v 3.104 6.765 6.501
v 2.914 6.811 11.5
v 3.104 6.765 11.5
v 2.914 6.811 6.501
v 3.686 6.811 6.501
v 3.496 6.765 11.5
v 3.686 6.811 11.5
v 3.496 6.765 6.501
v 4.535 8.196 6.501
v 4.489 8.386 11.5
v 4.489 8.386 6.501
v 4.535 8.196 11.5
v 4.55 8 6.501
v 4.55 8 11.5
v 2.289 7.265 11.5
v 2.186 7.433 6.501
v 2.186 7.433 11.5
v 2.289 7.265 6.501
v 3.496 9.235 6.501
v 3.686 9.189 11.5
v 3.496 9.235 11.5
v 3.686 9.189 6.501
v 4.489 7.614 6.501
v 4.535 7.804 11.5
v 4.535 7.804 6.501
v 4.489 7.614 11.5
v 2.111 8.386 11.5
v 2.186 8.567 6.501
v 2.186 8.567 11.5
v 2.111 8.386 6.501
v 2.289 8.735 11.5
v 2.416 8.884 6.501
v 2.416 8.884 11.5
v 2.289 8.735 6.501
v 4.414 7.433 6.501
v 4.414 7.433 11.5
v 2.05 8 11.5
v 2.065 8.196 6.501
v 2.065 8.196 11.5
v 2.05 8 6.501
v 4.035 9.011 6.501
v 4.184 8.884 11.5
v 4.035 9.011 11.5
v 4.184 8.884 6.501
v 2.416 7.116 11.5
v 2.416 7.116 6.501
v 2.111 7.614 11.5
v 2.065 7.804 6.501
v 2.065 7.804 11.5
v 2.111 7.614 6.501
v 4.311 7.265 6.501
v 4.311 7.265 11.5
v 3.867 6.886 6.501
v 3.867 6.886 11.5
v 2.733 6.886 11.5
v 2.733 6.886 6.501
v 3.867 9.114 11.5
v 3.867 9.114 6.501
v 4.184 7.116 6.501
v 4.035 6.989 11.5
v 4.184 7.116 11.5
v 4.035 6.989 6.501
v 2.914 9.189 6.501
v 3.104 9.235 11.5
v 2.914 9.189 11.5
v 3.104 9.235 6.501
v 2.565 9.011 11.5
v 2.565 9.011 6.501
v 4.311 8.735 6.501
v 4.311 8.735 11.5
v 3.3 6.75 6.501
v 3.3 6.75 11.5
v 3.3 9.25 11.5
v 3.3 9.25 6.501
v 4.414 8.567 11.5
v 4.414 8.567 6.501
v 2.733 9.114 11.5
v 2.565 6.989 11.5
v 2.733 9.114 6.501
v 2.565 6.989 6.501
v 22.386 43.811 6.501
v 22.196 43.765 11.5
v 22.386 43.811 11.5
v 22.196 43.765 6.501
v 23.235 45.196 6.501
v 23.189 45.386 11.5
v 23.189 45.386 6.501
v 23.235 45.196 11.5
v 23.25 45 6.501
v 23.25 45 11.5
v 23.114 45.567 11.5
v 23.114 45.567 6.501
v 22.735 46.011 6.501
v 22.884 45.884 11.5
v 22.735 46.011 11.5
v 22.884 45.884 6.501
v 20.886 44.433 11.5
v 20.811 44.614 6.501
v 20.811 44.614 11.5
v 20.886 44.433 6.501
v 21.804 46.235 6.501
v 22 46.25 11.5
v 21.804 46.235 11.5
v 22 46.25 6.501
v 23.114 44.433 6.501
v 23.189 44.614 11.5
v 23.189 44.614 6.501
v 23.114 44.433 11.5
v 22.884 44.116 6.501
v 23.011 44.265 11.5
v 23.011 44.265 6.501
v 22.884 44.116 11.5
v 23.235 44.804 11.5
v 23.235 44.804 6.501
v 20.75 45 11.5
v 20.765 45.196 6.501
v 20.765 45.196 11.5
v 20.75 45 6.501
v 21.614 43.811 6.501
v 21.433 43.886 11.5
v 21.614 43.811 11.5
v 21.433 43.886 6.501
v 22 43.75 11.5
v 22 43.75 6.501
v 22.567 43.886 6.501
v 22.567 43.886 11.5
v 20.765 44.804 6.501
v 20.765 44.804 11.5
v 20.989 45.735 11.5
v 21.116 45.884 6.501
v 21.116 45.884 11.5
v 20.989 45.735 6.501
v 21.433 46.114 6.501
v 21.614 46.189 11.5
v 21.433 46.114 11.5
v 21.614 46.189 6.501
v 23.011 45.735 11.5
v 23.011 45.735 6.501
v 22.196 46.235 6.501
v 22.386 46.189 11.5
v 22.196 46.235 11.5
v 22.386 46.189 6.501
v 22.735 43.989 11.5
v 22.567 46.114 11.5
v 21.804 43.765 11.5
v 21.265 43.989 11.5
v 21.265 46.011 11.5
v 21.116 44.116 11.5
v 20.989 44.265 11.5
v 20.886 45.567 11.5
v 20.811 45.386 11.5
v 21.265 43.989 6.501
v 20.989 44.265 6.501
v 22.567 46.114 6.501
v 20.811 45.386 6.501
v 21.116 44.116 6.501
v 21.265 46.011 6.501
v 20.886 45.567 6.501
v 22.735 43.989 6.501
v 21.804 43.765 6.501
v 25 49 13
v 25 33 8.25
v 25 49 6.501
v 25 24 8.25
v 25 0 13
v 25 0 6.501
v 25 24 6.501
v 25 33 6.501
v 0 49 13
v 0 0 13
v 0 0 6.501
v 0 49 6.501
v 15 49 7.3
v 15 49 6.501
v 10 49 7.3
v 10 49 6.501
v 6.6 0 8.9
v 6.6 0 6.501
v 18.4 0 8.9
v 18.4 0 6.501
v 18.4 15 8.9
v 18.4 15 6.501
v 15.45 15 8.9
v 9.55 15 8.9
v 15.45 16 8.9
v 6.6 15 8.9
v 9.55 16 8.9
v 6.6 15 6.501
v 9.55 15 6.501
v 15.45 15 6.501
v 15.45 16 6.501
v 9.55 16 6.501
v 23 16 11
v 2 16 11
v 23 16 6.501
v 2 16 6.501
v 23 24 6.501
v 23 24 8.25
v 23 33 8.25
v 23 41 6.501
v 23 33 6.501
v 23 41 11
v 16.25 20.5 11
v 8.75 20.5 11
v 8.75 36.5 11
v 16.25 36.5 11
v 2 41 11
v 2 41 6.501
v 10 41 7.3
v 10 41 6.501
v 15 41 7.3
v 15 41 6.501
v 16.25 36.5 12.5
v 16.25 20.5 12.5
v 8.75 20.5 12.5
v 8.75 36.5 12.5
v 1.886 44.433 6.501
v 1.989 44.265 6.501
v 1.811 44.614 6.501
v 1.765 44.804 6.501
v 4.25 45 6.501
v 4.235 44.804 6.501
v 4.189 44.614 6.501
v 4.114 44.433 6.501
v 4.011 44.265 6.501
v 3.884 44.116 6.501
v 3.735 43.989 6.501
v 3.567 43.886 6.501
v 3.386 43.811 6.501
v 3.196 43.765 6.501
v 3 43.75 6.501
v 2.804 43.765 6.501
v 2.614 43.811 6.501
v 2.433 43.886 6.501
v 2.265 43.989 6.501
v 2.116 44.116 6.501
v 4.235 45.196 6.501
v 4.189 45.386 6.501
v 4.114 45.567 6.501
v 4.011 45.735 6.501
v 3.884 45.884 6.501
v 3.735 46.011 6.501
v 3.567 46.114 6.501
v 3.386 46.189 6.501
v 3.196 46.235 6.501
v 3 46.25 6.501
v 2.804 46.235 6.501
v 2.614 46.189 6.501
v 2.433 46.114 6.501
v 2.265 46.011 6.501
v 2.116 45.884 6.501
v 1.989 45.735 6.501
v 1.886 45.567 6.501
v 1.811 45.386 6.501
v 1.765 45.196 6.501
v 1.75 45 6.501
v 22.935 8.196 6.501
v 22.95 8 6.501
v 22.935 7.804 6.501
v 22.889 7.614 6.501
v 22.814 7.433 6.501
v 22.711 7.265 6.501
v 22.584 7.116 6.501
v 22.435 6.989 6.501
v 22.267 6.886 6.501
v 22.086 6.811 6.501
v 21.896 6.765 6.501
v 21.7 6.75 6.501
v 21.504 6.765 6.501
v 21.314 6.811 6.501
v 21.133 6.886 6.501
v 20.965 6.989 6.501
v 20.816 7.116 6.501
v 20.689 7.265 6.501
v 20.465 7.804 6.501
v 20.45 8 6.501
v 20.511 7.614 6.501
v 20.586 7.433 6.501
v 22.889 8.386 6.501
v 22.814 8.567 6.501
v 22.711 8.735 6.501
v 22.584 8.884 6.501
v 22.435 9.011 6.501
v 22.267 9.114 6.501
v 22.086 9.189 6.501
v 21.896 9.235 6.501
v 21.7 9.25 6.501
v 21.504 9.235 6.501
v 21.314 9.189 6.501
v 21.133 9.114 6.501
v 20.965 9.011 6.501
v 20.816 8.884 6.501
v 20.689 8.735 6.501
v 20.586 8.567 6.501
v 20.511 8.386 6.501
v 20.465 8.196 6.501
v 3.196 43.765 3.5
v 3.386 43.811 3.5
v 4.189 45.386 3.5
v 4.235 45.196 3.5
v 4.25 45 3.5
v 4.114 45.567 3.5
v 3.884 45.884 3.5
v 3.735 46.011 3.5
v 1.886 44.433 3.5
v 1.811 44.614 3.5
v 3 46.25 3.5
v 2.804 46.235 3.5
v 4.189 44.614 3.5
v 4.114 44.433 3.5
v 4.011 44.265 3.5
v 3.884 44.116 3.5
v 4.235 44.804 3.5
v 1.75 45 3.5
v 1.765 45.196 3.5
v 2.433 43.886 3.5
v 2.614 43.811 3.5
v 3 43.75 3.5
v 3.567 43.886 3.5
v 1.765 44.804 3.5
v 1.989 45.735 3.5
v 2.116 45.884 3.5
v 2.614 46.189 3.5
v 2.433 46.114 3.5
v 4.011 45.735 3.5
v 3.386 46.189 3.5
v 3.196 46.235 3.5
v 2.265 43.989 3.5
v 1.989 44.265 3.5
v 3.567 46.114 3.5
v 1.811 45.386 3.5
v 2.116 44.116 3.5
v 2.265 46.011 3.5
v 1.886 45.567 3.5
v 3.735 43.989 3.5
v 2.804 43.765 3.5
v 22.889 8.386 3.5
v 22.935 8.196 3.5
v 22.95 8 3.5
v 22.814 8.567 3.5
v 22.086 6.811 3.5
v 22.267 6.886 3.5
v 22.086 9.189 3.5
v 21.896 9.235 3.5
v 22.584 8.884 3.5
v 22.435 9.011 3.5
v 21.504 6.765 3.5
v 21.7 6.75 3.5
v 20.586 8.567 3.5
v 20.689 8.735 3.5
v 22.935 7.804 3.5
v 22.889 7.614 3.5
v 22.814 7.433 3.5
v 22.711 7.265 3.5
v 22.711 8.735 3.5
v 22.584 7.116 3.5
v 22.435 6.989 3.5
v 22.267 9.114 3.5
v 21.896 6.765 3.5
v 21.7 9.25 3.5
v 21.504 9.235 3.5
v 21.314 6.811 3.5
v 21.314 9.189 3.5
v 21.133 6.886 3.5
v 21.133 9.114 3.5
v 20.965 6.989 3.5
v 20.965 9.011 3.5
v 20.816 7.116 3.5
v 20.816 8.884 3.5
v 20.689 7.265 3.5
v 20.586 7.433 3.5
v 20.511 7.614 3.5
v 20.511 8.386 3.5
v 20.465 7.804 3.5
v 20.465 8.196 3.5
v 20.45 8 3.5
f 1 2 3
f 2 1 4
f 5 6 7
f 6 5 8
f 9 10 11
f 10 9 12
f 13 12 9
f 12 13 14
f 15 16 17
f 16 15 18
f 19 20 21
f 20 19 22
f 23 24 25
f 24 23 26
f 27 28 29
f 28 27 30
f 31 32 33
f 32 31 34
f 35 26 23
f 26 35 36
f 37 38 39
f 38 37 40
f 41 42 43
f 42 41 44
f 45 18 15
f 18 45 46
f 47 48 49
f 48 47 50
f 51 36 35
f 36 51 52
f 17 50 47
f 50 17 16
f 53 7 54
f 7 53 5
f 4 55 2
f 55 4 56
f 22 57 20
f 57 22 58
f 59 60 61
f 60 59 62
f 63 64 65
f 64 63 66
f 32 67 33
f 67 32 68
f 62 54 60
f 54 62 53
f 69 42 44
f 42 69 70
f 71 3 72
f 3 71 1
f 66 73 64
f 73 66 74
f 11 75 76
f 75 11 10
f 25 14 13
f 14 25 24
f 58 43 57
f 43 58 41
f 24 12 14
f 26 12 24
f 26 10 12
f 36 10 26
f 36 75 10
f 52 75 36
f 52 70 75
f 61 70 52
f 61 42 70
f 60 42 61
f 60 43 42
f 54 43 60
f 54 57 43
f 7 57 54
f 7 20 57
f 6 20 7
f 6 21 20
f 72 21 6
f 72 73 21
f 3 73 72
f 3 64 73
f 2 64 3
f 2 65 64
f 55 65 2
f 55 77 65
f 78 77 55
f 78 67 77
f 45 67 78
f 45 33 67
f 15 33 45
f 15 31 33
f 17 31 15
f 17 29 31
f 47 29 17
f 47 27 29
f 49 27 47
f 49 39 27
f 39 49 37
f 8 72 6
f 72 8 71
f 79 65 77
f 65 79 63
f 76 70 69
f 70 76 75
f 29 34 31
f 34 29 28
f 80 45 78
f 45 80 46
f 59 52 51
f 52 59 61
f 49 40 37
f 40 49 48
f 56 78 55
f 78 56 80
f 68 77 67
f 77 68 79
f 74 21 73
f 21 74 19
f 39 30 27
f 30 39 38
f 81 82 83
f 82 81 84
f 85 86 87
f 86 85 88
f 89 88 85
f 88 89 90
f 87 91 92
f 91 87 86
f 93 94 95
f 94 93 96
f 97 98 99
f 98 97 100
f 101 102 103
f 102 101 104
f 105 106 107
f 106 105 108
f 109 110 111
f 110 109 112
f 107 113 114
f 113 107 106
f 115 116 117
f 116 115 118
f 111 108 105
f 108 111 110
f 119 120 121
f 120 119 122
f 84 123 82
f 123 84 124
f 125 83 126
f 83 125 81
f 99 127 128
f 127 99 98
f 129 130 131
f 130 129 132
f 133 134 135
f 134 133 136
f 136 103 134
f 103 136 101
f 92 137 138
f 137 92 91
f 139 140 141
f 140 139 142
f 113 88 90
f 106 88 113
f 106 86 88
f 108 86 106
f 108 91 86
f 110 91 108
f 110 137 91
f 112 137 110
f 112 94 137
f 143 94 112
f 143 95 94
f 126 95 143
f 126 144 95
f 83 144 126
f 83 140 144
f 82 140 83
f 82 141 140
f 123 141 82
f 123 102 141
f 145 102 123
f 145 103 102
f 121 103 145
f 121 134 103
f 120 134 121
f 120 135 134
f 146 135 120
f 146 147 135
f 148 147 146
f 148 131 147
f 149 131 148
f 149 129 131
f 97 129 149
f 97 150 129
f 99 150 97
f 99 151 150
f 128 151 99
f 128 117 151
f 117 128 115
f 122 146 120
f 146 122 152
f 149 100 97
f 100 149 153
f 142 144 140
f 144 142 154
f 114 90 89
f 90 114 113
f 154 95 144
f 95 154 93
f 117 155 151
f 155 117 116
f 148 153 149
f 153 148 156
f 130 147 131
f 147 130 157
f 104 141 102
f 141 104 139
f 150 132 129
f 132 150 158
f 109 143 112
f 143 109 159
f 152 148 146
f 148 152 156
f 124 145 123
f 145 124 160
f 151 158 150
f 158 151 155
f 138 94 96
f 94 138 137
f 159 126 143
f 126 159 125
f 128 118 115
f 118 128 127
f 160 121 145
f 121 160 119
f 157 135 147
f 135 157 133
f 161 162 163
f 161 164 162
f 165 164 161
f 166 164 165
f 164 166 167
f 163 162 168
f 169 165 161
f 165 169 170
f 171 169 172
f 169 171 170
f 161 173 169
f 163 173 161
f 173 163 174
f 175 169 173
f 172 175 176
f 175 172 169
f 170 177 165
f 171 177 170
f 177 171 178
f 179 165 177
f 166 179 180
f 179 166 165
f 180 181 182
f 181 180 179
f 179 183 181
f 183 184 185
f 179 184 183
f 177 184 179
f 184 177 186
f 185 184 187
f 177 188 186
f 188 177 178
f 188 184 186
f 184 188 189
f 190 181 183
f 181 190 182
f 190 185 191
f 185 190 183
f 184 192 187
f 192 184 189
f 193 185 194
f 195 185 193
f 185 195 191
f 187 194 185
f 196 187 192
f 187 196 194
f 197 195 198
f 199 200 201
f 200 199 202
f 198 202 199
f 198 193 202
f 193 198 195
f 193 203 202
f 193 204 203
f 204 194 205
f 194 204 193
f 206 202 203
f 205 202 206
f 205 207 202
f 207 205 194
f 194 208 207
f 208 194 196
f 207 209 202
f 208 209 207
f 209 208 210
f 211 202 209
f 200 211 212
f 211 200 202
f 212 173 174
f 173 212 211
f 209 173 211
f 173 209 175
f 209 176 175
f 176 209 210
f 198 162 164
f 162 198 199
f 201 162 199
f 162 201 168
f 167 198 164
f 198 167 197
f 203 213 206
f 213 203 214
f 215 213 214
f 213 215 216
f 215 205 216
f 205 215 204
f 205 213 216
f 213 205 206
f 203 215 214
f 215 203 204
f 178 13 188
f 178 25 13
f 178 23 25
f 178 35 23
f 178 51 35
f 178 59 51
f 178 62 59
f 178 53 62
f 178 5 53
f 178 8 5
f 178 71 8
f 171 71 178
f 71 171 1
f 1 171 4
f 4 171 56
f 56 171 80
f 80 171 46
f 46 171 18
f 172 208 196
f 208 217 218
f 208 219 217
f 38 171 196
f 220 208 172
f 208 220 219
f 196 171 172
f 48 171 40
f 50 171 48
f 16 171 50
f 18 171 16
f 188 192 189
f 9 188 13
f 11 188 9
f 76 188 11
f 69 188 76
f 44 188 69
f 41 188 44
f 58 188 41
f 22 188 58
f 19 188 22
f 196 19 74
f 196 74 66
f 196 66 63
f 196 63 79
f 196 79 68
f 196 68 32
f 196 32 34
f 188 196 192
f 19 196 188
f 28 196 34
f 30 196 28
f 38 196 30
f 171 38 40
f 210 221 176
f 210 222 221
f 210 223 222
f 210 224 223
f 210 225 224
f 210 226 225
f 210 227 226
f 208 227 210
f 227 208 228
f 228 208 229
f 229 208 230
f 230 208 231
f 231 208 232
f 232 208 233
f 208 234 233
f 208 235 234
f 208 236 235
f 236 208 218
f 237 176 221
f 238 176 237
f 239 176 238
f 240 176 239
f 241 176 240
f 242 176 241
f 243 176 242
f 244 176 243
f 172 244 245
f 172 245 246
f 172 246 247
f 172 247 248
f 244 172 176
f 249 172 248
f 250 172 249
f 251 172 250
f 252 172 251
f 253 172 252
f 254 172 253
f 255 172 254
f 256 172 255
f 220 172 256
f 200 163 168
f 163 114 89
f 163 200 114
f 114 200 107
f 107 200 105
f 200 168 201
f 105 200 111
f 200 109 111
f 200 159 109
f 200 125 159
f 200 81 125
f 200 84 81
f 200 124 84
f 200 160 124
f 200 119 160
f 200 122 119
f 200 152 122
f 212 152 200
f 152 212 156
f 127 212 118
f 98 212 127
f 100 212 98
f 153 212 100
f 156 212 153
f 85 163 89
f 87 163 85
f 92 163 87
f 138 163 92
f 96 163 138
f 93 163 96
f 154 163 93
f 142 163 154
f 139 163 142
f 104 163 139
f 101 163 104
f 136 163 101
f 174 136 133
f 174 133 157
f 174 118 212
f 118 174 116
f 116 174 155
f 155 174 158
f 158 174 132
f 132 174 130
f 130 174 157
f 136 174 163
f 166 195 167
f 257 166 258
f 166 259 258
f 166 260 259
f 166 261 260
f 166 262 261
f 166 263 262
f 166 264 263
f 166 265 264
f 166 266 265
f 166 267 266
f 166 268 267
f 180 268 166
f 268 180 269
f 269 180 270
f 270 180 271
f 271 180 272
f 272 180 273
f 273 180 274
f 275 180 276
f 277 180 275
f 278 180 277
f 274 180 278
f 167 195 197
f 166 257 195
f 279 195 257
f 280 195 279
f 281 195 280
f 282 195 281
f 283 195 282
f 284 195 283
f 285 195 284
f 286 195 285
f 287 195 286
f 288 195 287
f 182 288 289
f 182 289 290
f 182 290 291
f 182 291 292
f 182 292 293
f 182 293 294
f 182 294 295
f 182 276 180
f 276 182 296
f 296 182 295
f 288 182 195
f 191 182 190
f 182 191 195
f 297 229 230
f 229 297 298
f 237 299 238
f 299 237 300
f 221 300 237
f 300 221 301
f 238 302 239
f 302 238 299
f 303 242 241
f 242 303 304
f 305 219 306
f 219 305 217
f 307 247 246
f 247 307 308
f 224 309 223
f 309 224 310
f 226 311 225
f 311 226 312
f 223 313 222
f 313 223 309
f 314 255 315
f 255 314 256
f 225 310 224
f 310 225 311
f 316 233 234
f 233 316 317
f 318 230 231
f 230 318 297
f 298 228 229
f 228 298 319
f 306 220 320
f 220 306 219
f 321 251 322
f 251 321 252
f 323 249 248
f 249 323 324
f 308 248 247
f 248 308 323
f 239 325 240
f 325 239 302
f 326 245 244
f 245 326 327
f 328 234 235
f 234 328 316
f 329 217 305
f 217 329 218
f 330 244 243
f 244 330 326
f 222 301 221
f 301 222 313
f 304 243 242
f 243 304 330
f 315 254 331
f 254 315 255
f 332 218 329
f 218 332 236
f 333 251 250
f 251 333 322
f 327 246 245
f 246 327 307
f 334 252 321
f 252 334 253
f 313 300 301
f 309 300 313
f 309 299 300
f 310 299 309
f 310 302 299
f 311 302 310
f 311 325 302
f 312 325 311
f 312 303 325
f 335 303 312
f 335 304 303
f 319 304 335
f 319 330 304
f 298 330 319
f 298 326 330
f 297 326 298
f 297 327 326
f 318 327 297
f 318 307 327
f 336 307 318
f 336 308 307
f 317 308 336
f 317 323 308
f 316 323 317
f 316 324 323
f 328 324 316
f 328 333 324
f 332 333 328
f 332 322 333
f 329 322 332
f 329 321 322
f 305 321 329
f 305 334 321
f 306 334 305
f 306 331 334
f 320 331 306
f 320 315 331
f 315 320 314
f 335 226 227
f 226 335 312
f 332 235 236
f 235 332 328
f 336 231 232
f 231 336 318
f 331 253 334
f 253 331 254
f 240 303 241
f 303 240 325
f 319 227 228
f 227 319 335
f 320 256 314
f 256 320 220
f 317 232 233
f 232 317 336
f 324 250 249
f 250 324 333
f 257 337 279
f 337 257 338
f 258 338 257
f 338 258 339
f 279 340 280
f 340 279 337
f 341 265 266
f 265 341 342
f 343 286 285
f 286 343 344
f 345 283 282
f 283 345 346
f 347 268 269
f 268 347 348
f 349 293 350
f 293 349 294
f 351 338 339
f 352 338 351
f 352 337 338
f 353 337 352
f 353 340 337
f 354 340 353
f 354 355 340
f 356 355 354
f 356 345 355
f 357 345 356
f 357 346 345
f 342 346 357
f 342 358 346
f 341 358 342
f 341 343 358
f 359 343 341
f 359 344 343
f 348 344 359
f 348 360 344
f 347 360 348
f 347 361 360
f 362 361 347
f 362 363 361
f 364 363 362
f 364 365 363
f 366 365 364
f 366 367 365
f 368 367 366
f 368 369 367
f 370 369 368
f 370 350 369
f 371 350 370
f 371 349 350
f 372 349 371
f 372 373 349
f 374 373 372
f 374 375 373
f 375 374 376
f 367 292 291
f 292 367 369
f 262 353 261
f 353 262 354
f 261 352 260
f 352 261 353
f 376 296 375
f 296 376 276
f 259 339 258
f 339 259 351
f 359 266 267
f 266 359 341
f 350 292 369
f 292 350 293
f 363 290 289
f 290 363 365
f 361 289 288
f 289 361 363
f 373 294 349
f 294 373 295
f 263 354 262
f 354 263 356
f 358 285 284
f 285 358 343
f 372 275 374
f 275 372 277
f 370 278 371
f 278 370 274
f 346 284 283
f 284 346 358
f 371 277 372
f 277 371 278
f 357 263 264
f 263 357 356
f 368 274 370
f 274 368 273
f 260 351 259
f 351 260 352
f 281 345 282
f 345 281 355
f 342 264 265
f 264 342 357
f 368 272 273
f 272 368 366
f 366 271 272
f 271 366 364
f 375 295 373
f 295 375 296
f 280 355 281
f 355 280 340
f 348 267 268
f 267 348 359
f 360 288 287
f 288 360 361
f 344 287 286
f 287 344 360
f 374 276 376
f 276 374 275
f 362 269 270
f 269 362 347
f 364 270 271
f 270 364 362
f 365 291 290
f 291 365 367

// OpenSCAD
$fn=40;

USB_width = 11.8;
USB_height = 4.8;
USB_length = 16;

USBC_Height = 3.5;
USBC_Width = 9;
USBC_Side = 1;

BoardWidth = 21;
BoardHeight = 9;
Board_Length = 25;

// Sensor_Width = 17.8;
// Sensor_Height = 9;
// Sensor_Length = 0;
Sensor_Wall = 8;
Sensor_CableGapWidth = 5;
Sensor_CableGapHeight = 1.6;

LED_Length = 16;
LED_Width = 7.5;

wall = 2;
connector_Diameter = 2.5;
connector_Height = 6;

Full_Length = USB_length + Board_Length + Sensor_Wall;
Full_Heigh = BoardHeight + 2 * wall;
Full_Width = BoardWidth + 2 * wall;

Grid_Size = 2.9;
Grid_Gap = 0.8;
Grid_Rows = 7;

upper = 0;

difference()
{
    cube([BoardWidth+2*wall, Full_Length, Full_Heigh]);
    // USB-A
    translate([(Full_Width-USB_width)/2, -1 , (Full_Heigh-USB_height)/2])
        cube([USB_width, USB_length, USB_height]);
    translate([(Full_Width-USB_width/2)/2, 0 , (Full_Heigh-USB_height)/2])
        cube([USB_width/2, USB_length, USB_height]);
    // Board
    translate([(Full_Width-BoardWidth)/2, USB_length , (Full_Heigh-BoardHeight)/2])
        cube([BoardWidth, Board_Length, BoardHeight]);
    // Sensor
    // translate([(Full_Width-Sensor_Width)/2, USB_length+Board_Length-Sensor_Wall , (Full_Heigh-Sensor_Height)/2])
    //     cube([Sensor_Width, Sensor_Length, Sensor_Height]);
    // Sensor Cable Gap
    translate([(Full_Width-Sensor_CableGapWidth)/2, USB_length+Board_Length , (Full_Heigh-Sensor_CableGapHeight)/2])
        cube([Sensor_CableGapWidth, Sensor_Wall, Sensor_CableGapHeight]);
    // USB-C
    translate([(Full_Width-wall)*USBC_Side, USB_length+(Board_Length-USBC_Width)/2 , (Full_Heigh-USBC_Height)/2])
        cube([5, USBC_Width, USBC_Height]);
    // LED
    translate([(Full_Width-LED_Width)/2, USB_length+(Board_Length-LED_Length)/2 , 0.5])
        cube([LED_Width, LED_Length, Full_Heigh-1]);

    translate([-1,-1,Full_Heigh/2*upper])
        cube([BoardWidth+2*wall+2, Full_Length+2, Full_Heigh/2+.001]);

    if (upper == 1) {
        Pins1();
    }
    else {
        Pins2();
    }
}

if (upper == 1) {
    Pins2();
}
else {
    Pins1();
}

module Pins1()
{
    translate([3, Full_Length-4, (Full_Heigh-connector_Height)/2-2*upper])
        cylinder(d=connector_Diameter, h=connector_Height+2);
    translate([Full_Width-(Full_Width-USB_width)/4, USB_length/2, (Full_Heigh-connector_Height)/2-2*upper])
        cylinder(d=connector_Diameter, h=connector_Height+2);
}

module Pins2()
{
    height = (Full_Heigh-connector_Height)/2-2*upper;
    translate([(Full_Width-USB_width)/4, USB_length/2, height])
        cylinder(d=connector_Diameter, h=connector_Height+2);
    translate([Full_Width-3, Full_Length-4, height])
        cylinder(d=connector_Diameter, h=connector_Height+2);
}
